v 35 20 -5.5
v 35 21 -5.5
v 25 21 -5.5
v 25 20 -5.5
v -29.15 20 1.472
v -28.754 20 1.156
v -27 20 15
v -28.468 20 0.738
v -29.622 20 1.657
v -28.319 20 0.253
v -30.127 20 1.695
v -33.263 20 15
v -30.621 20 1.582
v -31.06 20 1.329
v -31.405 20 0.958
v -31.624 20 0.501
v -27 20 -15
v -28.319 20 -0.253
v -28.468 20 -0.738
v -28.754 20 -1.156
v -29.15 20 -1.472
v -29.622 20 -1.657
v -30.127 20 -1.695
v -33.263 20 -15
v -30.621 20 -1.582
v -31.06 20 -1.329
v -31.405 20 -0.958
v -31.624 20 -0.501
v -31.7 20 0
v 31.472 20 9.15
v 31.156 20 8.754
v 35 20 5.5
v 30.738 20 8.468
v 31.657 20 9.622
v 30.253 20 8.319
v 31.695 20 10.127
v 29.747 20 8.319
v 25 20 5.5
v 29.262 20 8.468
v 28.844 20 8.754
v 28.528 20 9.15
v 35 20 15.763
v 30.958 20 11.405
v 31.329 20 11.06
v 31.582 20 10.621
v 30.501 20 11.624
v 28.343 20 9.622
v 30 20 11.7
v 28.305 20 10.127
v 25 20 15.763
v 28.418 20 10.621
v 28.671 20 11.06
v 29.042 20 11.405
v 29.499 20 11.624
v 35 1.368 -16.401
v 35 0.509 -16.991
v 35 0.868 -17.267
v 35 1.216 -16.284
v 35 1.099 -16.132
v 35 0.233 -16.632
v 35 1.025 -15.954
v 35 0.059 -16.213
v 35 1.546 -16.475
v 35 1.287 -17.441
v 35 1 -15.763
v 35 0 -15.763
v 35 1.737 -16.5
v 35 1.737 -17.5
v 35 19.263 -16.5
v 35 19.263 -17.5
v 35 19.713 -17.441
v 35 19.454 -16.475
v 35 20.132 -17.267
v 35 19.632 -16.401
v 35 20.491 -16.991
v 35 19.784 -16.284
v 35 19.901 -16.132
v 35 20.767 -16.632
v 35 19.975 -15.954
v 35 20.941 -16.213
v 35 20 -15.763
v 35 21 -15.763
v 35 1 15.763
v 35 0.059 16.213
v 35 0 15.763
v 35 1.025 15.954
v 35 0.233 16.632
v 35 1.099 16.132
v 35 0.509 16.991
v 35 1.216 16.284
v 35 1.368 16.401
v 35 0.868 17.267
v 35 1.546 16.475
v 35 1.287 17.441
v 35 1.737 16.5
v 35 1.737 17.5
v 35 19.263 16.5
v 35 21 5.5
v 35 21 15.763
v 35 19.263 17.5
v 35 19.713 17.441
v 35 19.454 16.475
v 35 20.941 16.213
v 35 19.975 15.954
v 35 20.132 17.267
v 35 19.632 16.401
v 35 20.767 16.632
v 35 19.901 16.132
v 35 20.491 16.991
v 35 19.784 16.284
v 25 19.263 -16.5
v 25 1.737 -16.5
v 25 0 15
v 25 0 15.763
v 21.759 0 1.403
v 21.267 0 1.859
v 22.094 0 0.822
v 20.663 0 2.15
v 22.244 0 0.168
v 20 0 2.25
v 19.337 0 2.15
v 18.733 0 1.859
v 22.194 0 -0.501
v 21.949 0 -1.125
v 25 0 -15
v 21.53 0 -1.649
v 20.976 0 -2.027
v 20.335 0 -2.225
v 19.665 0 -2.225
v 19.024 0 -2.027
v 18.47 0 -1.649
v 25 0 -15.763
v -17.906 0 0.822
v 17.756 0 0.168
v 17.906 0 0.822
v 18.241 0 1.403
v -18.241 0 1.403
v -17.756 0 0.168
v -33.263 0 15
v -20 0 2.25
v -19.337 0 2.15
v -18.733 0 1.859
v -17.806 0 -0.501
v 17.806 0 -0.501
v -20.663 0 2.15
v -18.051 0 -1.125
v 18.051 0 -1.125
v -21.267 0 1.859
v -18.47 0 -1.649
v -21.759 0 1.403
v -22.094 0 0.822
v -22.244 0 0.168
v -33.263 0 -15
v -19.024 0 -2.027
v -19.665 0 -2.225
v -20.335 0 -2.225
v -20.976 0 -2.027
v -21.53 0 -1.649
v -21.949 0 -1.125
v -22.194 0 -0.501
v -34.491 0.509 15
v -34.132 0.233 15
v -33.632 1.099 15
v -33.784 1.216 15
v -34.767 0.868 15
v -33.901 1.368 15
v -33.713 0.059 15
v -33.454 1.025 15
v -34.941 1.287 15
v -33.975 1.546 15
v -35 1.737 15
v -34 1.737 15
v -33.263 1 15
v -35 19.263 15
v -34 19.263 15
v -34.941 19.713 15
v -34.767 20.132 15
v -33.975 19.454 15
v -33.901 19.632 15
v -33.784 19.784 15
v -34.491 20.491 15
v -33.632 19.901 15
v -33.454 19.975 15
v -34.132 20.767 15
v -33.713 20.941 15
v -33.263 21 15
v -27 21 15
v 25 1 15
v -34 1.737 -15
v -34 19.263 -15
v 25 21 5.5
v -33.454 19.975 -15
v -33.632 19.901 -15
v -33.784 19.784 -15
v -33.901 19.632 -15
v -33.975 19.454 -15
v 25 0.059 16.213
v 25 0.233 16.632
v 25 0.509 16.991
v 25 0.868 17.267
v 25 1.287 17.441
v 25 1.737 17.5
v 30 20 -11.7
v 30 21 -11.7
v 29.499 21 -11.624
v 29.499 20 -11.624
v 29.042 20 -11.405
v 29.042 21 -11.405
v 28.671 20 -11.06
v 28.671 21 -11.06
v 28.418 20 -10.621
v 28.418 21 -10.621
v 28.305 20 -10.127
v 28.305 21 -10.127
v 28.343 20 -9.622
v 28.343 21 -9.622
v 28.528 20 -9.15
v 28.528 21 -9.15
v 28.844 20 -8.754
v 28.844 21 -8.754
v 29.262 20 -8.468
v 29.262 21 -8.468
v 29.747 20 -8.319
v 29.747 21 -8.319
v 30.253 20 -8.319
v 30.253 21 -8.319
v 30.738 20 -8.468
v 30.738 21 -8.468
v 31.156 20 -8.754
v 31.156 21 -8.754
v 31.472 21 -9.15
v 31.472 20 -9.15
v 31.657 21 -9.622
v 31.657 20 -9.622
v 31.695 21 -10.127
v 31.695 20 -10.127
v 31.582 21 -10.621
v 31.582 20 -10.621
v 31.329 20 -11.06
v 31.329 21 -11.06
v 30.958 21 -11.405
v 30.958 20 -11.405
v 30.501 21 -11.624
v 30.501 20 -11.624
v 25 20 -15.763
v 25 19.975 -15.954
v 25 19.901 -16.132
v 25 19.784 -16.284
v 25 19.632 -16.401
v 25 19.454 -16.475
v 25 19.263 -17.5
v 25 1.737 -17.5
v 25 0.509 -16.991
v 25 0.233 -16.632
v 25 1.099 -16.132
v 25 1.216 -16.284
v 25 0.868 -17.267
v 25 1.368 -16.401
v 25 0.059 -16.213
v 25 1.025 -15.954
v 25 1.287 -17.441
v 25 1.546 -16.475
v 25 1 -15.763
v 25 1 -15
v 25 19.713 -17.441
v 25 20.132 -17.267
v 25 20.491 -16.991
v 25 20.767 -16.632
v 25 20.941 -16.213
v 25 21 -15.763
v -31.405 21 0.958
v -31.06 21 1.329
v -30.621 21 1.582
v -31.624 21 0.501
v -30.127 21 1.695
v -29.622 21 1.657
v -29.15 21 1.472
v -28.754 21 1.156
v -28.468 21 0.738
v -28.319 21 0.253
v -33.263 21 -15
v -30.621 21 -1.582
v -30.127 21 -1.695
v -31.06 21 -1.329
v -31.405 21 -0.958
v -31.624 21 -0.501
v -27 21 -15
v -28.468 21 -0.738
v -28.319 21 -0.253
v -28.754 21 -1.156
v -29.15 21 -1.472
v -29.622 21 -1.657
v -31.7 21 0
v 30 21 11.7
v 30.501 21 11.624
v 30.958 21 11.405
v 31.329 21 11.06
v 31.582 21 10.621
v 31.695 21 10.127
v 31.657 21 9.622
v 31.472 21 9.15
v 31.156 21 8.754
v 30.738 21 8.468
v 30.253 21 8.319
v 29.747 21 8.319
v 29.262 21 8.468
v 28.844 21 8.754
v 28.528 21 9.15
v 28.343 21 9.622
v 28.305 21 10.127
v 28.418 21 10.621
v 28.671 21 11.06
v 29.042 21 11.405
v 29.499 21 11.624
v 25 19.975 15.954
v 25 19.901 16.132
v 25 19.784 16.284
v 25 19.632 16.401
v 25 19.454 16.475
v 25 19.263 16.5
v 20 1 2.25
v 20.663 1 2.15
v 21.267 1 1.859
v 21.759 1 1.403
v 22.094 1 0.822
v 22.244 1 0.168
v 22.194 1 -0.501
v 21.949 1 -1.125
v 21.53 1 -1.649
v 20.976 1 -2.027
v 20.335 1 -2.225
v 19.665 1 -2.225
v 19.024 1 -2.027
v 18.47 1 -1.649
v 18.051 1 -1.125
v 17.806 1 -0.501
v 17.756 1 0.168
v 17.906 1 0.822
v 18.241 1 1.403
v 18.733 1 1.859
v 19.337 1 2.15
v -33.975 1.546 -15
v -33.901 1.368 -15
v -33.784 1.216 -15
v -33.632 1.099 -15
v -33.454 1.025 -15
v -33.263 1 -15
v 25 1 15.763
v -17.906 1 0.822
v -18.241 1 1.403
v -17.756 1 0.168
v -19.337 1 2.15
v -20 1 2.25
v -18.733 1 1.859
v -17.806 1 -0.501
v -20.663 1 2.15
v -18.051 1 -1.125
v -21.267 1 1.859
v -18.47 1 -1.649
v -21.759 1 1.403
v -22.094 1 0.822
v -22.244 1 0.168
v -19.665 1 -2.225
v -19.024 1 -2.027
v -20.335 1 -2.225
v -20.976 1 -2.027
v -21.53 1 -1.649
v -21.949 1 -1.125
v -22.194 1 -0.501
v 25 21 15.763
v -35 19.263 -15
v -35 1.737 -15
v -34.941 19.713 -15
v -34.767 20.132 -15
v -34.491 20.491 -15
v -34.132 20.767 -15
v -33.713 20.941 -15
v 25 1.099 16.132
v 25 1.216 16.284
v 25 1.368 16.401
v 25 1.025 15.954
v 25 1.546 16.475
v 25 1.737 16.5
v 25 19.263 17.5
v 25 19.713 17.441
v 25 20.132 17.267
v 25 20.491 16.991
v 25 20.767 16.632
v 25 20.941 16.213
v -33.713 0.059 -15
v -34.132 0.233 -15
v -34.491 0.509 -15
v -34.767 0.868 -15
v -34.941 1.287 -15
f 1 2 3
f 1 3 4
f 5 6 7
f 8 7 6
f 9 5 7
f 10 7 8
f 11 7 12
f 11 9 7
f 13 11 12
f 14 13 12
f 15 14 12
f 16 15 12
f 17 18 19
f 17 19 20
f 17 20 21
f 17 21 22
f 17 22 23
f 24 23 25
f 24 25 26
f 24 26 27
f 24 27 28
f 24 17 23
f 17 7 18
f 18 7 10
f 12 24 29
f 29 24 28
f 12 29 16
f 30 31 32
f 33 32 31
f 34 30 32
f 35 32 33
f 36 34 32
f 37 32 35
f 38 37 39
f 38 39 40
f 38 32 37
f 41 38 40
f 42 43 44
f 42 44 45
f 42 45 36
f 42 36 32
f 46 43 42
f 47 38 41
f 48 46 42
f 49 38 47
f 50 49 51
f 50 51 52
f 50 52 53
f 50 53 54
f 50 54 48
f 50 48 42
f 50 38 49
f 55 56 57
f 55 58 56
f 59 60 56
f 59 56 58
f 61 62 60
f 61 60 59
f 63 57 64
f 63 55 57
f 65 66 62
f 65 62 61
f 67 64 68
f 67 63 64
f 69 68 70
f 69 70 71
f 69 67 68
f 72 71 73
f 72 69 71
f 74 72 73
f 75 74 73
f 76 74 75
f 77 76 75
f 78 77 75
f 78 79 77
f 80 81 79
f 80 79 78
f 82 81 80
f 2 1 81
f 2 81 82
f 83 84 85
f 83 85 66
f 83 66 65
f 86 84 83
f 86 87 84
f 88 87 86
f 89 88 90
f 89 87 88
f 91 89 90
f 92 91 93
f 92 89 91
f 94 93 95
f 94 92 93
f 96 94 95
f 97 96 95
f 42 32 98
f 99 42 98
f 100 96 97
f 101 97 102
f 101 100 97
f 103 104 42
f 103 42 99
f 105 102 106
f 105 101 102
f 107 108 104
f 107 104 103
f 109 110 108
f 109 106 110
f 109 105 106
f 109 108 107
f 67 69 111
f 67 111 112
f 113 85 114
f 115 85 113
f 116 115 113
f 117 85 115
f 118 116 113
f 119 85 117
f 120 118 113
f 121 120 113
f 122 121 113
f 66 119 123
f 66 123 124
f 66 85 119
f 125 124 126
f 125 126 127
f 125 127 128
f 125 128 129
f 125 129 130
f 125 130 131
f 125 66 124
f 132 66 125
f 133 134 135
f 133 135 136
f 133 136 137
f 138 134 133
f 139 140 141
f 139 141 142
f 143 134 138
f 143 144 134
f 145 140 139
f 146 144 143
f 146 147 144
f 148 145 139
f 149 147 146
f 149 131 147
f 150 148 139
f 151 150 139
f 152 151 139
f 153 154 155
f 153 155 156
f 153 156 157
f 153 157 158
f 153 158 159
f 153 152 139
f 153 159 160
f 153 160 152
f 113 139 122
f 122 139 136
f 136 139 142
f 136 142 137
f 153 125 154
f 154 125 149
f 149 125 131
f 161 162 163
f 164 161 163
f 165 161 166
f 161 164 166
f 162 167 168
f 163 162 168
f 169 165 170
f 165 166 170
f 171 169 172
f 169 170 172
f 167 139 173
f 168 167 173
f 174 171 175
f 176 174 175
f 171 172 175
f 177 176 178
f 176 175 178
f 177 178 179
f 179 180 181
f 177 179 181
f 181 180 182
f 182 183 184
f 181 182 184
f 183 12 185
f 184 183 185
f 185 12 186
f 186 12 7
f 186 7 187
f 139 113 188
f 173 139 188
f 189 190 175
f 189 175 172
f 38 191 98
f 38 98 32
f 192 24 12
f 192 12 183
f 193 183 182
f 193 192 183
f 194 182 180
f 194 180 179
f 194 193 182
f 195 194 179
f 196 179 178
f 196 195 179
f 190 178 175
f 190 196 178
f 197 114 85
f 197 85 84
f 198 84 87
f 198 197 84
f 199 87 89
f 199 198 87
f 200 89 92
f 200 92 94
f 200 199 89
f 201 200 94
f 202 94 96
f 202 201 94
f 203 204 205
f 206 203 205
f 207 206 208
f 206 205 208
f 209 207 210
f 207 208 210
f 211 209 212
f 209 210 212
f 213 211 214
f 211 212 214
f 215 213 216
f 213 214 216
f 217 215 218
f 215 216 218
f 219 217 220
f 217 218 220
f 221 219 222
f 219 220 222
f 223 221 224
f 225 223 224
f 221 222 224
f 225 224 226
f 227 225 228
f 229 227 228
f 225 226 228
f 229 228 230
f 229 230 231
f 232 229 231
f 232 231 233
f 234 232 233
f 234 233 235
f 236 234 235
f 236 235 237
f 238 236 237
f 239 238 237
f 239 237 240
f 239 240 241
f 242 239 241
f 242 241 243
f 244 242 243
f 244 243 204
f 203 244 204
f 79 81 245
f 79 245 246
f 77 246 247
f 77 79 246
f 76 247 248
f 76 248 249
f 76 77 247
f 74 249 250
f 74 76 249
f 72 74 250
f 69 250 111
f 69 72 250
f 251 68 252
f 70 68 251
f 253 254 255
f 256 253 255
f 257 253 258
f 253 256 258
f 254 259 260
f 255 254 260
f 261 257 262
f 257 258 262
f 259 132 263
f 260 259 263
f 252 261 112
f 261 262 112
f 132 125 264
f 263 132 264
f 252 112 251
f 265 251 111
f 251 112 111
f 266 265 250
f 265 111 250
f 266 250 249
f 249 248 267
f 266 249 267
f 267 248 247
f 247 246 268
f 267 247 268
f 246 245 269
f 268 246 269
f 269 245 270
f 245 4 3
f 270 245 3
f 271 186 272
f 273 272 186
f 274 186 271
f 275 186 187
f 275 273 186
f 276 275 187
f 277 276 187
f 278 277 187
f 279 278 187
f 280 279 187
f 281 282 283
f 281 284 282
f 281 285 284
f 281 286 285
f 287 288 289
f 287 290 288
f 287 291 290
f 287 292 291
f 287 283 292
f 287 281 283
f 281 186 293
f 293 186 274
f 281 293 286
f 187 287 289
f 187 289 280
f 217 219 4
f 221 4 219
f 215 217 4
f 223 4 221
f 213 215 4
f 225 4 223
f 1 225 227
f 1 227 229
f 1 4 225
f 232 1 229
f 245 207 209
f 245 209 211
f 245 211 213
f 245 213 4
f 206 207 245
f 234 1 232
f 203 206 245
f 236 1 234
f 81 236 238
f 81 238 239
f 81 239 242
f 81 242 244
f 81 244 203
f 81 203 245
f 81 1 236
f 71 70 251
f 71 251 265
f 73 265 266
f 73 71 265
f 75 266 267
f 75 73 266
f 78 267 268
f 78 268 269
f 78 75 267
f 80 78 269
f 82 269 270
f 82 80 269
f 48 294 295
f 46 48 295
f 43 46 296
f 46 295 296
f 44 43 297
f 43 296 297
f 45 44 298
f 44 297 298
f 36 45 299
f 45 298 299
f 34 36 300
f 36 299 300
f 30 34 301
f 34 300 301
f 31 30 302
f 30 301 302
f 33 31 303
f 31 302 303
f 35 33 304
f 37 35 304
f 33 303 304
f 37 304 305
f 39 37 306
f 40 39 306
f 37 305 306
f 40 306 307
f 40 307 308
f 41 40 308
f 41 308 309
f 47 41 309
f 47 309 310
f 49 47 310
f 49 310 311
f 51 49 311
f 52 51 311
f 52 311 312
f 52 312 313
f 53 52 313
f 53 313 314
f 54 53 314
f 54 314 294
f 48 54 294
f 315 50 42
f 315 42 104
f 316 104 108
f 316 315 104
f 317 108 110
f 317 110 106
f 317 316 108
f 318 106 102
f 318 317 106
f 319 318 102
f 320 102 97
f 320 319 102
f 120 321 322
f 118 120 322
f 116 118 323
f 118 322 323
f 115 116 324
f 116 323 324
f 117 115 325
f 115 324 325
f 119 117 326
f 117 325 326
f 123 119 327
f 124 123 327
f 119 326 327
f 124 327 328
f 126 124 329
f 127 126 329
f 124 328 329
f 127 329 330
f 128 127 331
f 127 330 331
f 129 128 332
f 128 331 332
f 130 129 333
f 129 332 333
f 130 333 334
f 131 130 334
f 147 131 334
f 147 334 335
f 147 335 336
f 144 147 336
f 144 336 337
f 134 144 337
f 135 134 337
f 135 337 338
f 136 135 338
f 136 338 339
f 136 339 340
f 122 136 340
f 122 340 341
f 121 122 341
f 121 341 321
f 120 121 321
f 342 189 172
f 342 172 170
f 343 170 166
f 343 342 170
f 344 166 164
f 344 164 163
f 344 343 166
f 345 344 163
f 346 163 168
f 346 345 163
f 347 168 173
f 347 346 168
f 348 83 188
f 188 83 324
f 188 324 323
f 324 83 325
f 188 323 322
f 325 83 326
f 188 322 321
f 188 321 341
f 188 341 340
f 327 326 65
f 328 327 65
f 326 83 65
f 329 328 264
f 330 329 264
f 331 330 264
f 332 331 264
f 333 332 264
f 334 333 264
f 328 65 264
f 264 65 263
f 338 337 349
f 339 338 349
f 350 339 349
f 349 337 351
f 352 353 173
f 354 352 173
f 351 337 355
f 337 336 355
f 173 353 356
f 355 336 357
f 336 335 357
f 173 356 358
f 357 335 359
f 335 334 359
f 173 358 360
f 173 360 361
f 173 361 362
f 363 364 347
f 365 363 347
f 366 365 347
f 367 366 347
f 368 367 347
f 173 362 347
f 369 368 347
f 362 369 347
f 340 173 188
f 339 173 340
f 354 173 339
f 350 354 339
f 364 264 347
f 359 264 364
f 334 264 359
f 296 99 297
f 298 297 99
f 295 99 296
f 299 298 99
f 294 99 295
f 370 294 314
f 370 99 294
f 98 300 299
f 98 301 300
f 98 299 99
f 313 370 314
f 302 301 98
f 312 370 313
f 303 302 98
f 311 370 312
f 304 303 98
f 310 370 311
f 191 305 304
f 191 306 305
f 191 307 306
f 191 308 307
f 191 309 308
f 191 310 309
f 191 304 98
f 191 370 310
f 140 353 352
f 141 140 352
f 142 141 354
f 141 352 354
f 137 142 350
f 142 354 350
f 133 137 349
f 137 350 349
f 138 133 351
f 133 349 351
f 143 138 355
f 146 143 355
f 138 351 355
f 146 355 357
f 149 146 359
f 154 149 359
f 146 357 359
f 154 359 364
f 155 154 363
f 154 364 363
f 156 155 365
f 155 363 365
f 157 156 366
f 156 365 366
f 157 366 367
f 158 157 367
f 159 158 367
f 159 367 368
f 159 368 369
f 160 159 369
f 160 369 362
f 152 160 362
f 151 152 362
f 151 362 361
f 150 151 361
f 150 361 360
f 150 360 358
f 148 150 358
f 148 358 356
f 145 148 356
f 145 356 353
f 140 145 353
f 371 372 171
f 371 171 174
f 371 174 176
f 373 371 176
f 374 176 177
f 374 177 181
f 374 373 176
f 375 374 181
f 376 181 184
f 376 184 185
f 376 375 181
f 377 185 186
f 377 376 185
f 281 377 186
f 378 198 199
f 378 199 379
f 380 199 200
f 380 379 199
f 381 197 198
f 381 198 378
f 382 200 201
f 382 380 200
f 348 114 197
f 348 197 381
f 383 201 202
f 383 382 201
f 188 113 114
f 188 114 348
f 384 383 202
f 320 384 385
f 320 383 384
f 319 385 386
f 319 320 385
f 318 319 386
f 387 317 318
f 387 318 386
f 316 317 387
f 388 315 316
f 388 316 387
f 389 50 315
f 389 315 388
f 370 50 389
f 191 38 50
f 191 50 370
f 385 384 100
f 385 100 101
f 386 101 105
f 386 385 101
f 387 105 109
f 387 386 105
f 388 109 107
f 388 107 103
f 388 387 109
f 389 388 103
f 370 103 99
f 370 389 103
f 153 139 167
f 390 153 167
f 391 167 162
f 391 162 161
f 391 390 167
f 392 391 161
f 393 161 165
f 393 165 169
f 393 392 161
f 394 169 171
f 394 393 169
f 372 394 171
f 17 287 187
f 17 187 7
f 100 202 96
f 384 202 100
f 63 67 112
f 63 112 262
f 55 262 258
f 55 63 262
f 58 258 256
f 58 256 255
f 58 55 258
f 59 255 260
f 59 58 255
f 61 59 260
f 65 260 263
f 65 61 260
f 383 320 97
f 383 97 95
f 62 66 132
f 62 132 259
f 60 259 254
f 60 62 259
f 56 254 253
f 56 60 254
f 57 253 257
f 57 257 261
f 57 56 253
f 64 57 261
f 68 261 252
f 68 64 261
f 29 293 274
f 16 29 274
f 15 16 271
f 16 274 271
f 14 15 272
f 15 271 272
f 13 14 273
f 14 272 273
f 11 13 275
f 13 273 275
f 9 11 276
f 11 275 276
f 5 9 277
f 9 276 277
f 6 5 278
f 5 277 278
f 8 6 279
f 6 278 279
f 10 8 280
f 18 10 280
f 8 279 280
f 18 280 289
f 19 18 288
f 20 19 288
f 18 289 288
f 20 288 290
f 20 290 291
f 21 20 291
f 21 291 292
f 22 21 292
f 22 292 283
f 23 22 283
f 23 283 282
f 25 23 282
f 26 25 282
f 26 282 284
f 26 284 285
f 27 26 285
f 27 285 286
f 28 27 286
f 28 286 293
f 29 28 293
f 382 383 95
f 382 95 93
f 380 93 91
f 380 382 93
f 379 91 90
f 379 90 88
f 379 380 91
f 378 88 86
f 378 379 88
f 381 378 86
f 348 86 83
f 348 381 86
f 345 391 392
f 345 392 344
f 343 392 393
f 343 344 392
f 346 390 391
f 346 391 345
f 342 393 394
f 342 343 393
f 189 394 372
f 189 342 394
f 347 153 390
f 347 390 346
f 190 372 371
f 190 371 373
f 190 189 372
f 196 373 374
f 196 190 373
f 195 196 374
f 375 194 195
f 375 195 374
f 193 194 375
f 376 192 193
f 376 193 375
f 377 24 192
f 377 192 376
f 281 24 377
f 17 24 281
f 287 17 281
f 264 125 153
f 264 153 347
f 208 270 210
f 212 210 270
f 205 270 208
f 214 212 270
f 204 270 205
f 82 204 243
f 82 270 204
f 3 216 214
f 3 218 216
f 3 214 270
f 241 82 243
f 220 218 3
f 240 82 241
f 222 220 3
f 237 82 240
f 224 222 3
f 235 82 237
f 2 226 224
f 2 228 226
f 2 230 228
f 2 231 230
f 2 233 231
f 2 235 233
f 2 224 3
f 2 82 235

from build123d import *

# Parameters (mm, degrees)
T_LE_DE_BASE_PLI_E1_DEPTH               = 1
T_LE_PLI_E_SUR_AR_TE1_STRIP_W           = 5.4732
T_LE_PLI_E_SUR_AR_TE1_STRIP_H           = 1
T_LE_PLI_E_SUR_AR_TE1_STRIP_CUT_DEPTH   = 30
T_LE_PLI_E_SUR_AR_TE1_DEPTH             = 30
T_LE_PLI_E_SUR_AR_TE2_STRIP_W           = 5.4732
T_LE_PLI_E_SUR_AR_TE2_STRIP_H           = 1
T_LE_PLI_E_SUR_AR_TE2_STRIP_CUT_DEPTH   = 30
T_LE_PLI_E_SUR_AR_TE2_DEPTH             = 30
ENL_V_MAT_EXTRU_1_REACH                 = 46.026
ESQUISSE12_R                            = 1.7
ENL_V_MAT_EXTRU_3_REACH                 = 45.557
ESQUISSE27_R                            = 2.25
T_LE_PLI_E_SUR_AR_TE3_STRIP_W           = 5.4732
T_LE_PLI_E_SUR_AR_TE3_STRIP_H           = 1
T_LE_PLI_E_SUR_AR_TE3_STRIP_CUT_DEPTH   = 10
T_LE_PLI_E_SUR_AR_TE3_STRIP_2_W         = 5.4732
T_LE_PLI_E_SUR_AR_TE3_STRIP_2_H         = 1
T_LE_PLI_E_SUR_AR_TE3_STRIP_CUT_2_DEPTH = 10
T_LE_PLI_E_SUR_AR_TE3_DEPTH             = 10
T_LE_PLI_E_SUR_AR_TE3_BEND_DEPTH        = 10
T_LE_PLI_E_SUR_AR_TE4_STRIP_W           = 5.4732
T_LE_PLI_E_SUR_AR_TE4_STRIP_H           = 1
T_LE_PLI_E_SUR_AR_TE4_STRIP_CUT_DEPTH   = 10
T_LE_PLI_E_SUR_AR_TE4_STRIP_2_W         = 5.4732
T_LE_PLI_E_SUR_AR_TE4_STRIP_2_H         = 1
T_LE_PLI_E_SUR_AR_TE4_STRIP_CUT_2_DEPTH = 10
T_LE_PLI_E_SUR_AR_TE4_DEPTH             = 10
T_LE_PLI_E_SUR_AR_TE4_BEND_DEPTH        = 10
ENL_V_MAT_EXTRU_2_REACH                 = 46.41
ESQUISSE26_R                            = 1.7


# Sheet-metal steps are written as plain solids
with BuildPart() as part:
    # Esquisse1 → Tôle de base pliée1 (new body)
    with BuildSketch(Plane(origin=(0, 0, 0), x_dir=(1, 0, 0), z_dir=(0, 1, 0))):
        Polygon((35, -15), (35, -16.5), (25, -16.5), (25, -15), (-35, -15), (-35, 15), (25, 15), (25, 16.5), (35, 16.5), (35, 15), align=None)
    extrude(amount=T_LE_DE_BASE_PLI_E1_DEPTH)

    # Tôle pliée sur arête1 strip (across the edge) → Tôle pliée sur arête1 strip cut (cut)
    with BuildSketch(Plane(origin=(-35, 1, -15), x_dir=(1, 0, 0), z_dir=(0, 0, 1))):
        with Locations((-1, -0.5)):
            Rectangle(T_LE_PLI_E_SUR_AR_TE1_STRIP_W, T_LE_PLI_E_SUR_AR_TE1_STRIP_H)
    extrude(amount=T_LE_PLI_E_SUR_AR_TE1_STRIP_CUT_DEPTH, mode=Mode.SUBTRACT)

    # Tôle pliée sur arête1 section (across the edge) → Tôle pliée sur arête1 (add)
    with BuildSketch(Plane(origin=(-35, 1, -15), x_dir=(1, 0, 0), z_dir=(0, 0, 1))):
        with BuildLine():
            Line((0, 0.7366), (0, 20))
            Line((0, 20), (1, 20))
            Line((1, 20), (1, 0.7366))
            ThreePointArc((1, 0.7366), (1.215745145, 0.215745145), (1.7366, 0))
            Line((1.7366, 0), (1.7366, -1))
            ThreePointArc((1.7366, -1), (0.508638364, -0.491361636), (0, 0.7366))
        make_face()
    extrude(amount=T_LE_PLI_E_SUR_AR_TE1_DEPTH)

    # Tôle pliée sur arête2 strip (across the edge) → Tôle pliée sur arête2 strip cut (cut)
    with BuildSketch(Plane(origin=(-34, 21, -15), x_dir=(0, -1, 0), z_dir=(0, 0, 1))):
        with Locations((-1, -0.5)):
            Rectangle(T_LE_PLI_E_SUR_AR_TE2_STRIP_W, T_LE_PLI_E_SUR_AR_TE2_STRIP_H)
    extrude(amount=T_LE_PLI_E_SUR_AR_TE2_STRIP_CUT_DEPTH, mode=Mode.SUBTRACT)

    # Tôle pliée sur arête2 section (across the edge) → Tôle pliée sur arête2 (add)
    with BuildSketch(Plane(origin=(-34, 21, -15), x_dir=(0, -1, 0), z_dir=(0, 0, 1))):
        with BuildLine():
            Line((0, 0.7366), (0, 7))
            Line((0, 7), (1, 7))
            Line((1, 7), (1, 0.7366))
            ThreePointArc((1, 0.7366), (1.215745145, 0.215745145), (1.7366, 0))
            Line((1.7366, 0), (1.7366, -1))
            ThreePointArc((1.7366, -1), (0.508638364, -0.491361636), (0, 0.7366))
        make_face()
    extrude(amount=T_LE_PLI_E_SUR_AR_TE2_DEPTH)

    # Esquisse12 → Enlèv. mat.-Extru.1 (cut, up to next)
    with BuildSketch(Plane(origin=(0, 21, 0), x_dir=(1, 0, 0), z_dir=(0, 1, 0)), mode=Mode.PRIVATE) as enl_v_mat_extru_1_sk1:
        with Locations(Location((-30, 0, 0), (0, 0, 180))):
            Circle(ESQUISSE12_R)
    enl_v_mat_extru_1_tool1 = extrude(enl_v_mat_extru_1_sk1.sketch, amount=-ENL_V_MAT_EXTRU_1_REACH, mode=Mode.PRIVATE) & part.part
    add(enl_v_mat_extru_1_tool1.solids().sort_by_distance((-30, 21, 0))[0], mode=Mode.SUBTRACT)

    # Esquisse27 → Enlèv. mat.-Extru.3 (cut, up to next)
    with BuildSketch(Plane(origin=(0, 1, 0), x_dir=(1, 0, 0), z_dir=(0, 1, 0)), mode=Mode.PRIVATE) as enl_v_mat_extru_3_sk1:
        with Locations(Location((-20, 0, 0), (0, 0, 270))):
            Circle(ESQUISSE27_R)
    enl_v_mat_extru_3_tool1 = extrude(enl_v_mat_extru_3_sk1.sketch, amount=-ENL_V_MAT_EXTRU_3_REACH, mode=Mode.PRIVATE) & part.part
    # Esquisse27 → Enlèv. mat.-Extru.3 (cut, up to next)
    with BuildSketch(Plane(origin=(0, 1, 0), x_dir=(1, 0, 0), z_dir=(0, 1, 0)), mode=Mode.PRIVATE) as enl_v_mat_extru_3_sk2:
        with Locations(Location((20, 0, 0), (0, 0, 270))):
            Circle(ESQUISSE27_R)
    enl_v_mat_extru_3_tool2 = extrude(enl_v_mat_extru_3_sk2.sketch, amount=-ENL_V_MAT_EXTRU_3_REACH, mode=Mode.PRIVATE) & part.part
    add(enl_v_mat_extru_3_tool1.solids().sort_by_distance((-20, 1, 0))[0], mode=Mode.SUBTRACT)
    add(enl_v_mat_extru_3_tool2.solids().sort_by_distance((20, 1, 0))[0], mode=Mode.SUBTRACT)

    # Tôle pliée sur arête3 strip (across the edge) → Tôle pliée sur arête3 strip cut (cut)
    with BuildSketch(Plane(origin=(25, 1, 16.5), x_dir=(0, 0, -1), z_dir=(1, 0, 0))):
        with Locations((-2, -0.5)):
            Rectangle(T_LE_PLI_E_SUR_AR_TE3_STRIP_W, T_LE_PLI_E_SUR_AR_TE3_STRIP_H)
    extrude(amount=T_LE_PLI_E_SUR_AR_TE3_STRIP_CUT_DEPTH, mode=Mode.SUBTRACT)

    # Tôle pliée sur arête3 strip 2 (across the edge) → Tôle pliée sur arête3 strip cut 2 (cut)
    with BuildSketch(Plane(origin=(35, 1, -16.5), x_dir=(0, 0, 1), z_dir=(-1, 0, 0))):
        with Locations((-2, -0.5)):
            Rectangle(T_LE_PLI_E_SUR_AR_TE3_STRIP_2_W, T_LE_PLI_E_SUR_AR_TE3_STRIP_2_H)
    extrude(amount=T_LE_PLI_E_SUR_AR_TE3_STRIP_CUT_2_DEPTH, mode=Mode.SUBTRACT)

    # Tôle pliée sur arête3 section (across the edge) → Tôle pliée sur arête3 (add)
    with BuildSketch(Plane(origin=(25, 1, 16.5), x_dir=(0, 0, -1), z_dir=(1, 0, 0))):
        with BuildLine():
            Line((-1, 0.7366), (-1, 19))
            Line((-1, 19), (0, 19))
            Line((0, 19), (0, 0.7366))
            ThreePointArc((0, 0.7366), (0.215745145, 0.215745145), (0.7366, 0))
            Line((0.7366, 0), (0.7366, -1))
            ThreePointArc((0.7366, -1), (-0.491361636, -0.491361636), (-1, 0.7366))
        make_face()
    extrude(amount=T_LE_PLI_E_SUR_AR_TE3_DEPTH)

    # Tôle pliée sur arête3 section 2 (across the edge) → Tôle pliée sur arête3 bend (add)
    with BuildSketch(Plane(origin=(35, 1, -16.5), x_dir=(0, 0, 1), z_dir=(-1, 0, 0))):
        with BuildLine():
            Line((-1, 0.7366), (-1, 19))
            Line((-1, 19), (0, 19))
            Line((0, 19), (0, 0.7366))
            ThreePointArc((0, 0.7366), (0.215745145, 0.215745145), (0.7366, 0))
            Line((0.7366, 0), (0.7366, -1))
            ThreePointArc((0.7366, -1), (-0.491361636, -0.491361636), (-1, 0.7366))
        make_face()
    extrude(amount=T_LE_PLI_E_SUR_AR_TE3_BEND_DEPTH)

    # Tôle pliée sur arête4 strip (across the edge) → Tôle pliée sur arête4 strip cut (cut)
    with BuildSketch(Plane(origin=(25, 20, 16.5), x_dir=(0, -1, 0), z_dir=(1, 0, 0))):
        with Locations((-2, -0.5)):
            Rectangle(T_LE_PLI_E_SUR_AR_TE4_STRIP_W, T_LE_PLI_E_SUR_AR_TE4_STRIP_H)
    extrude(amount=T_LE_PLI_E_SUR_AR_TE4_STRIP_CUT_DEPTH, mode=Mode.SUBTRACT)

    # Tôle pliée sur arête4 strip 2 (across the edge) → Tôle pliée sur arête4 strip cut 2 (cut)
    with BuildSketch(Plane(origin=(35, 20, -16.5), x_dir=(0, -1, 0), z_dir=(-1, 0, 0))):
        with Locations((-2, -0.5)):
            Rectangle(T_LE_PLI_E_SUR_AR_TE4_STRIP_2_W, T_LE_PLI_E_SUR_AR_TE4_STRIP_2_H)
    extrude(amount=T_LE_PLI_E_SUR_AR_TE4_STRIP_CUT_2_DEPTH, mode=Mode.SUBTRACT)

    # Tôle pliée sur arête4 section (across the edge) → Tôle pliée sur arête4 (add)
    with BuildSketch(Plane(origin=(25, 20, 16.5), x_dir=(0, -1, 0), z_dir=(1, 0, 0))):
        with BuildLine():
            Line((-1, 0.7366), (-1, 11))
            Line((-1, 11), (0, 11))
            Line((0, 11), (0, 0.7366))
            ThreePointArc((0, 0.7366), (0.215745145, 0.215745145), (0.7366, 0))
            Line((0.7366, 0), (0.7366, -1))
            ThreePointArc((0.7366, -1), (-0.491361636, -0.491361636), (-1, 0.7366))
        make_face()
    extrude(amount=T_LE_PLI_E_SUR_AR_TE4_DEPTH)

    # Tôle pliée sur arête4 section 2 (across the edge) → Tôle pliée sur arête4 bend (add)
    with BuildSketch(Plane(origin=(35, 20, -16.5), x_dir=(0, -1, 0), z_dir=(-1, 0, 0))):
        with BuildLine():
            Line((-1, 0.7366), (-1, 11))
            Line((-1, 11), (0, 11))
            Line((0, 11), (0, 0.7366))
            ThreePointArc((0, 0.7366), (0.215745145, 0.215745145), (0.7366, 0))
            Line((0.7366, 0), (0.7366, -1))
            ThreePointArc((0.7366, -1), (-0.491361636, -0.491361636), (-1, 0.7366))
        make_face()
    extrude(amount=T_LE_PLI_E_SUR_AR_TE4_BEND_DEPTH)

    # Esquisse26 → Enlèv. mat.-Extru.2 (cut, up to next)
    with BuildSketch(Plane(origin=(0, 21, 0), x_dir=(1, 0, 0), z_dir=(0, 1, 0)), mode=Mode.PRIVATE) as enl_v_mat_extru_2_sk1:
        with Locations(Location((30, -10, 0), (0, 0, 270))):
            Circle(ESQUISSE26_R)
    enl_v_mat_extru_2_tool1 = extrude(enl_v_mat_extru_2_sk1.sketch, amount=-ENL_V_MAT_EXTRU_2_REACH, mode=Mode.PRIVATE) & part.part
    # Esquisse26 → Enlèv. mat.-Extru.2 (cut, up to next)
    with BuildSketch(Plane(origin=(0, 21, 0), x_dir=(1, 0, 0), z_dir=(0, 1, 0)), mode=Mode.PRIVATE) as enl_v_mat_extru_2_sk2:
        with Locations(Location((30, 10, 0), (0, 0, 90))):
            Circle(ESQUISSE26_R)
    enl_v_mat_extru_2_tool2 = extrude(enl_v_mat_extru_2_sk2.sketch, amount=-ENL_V_MAT_EXTRU_2_REACH, mode=Mode.PRIVATE) & part.part
    add(enl_v_mat_extru_2_tool1.solids().sort_by_distance((30, 21, 10))[0], mode=Mode.SUBTRACT)
    add(enl_v_mat_extru_2_tool2.solids().sort_by_distance((30, 21, -10))[0], mode=Mode.SUBTRACT)


solid = part.part
